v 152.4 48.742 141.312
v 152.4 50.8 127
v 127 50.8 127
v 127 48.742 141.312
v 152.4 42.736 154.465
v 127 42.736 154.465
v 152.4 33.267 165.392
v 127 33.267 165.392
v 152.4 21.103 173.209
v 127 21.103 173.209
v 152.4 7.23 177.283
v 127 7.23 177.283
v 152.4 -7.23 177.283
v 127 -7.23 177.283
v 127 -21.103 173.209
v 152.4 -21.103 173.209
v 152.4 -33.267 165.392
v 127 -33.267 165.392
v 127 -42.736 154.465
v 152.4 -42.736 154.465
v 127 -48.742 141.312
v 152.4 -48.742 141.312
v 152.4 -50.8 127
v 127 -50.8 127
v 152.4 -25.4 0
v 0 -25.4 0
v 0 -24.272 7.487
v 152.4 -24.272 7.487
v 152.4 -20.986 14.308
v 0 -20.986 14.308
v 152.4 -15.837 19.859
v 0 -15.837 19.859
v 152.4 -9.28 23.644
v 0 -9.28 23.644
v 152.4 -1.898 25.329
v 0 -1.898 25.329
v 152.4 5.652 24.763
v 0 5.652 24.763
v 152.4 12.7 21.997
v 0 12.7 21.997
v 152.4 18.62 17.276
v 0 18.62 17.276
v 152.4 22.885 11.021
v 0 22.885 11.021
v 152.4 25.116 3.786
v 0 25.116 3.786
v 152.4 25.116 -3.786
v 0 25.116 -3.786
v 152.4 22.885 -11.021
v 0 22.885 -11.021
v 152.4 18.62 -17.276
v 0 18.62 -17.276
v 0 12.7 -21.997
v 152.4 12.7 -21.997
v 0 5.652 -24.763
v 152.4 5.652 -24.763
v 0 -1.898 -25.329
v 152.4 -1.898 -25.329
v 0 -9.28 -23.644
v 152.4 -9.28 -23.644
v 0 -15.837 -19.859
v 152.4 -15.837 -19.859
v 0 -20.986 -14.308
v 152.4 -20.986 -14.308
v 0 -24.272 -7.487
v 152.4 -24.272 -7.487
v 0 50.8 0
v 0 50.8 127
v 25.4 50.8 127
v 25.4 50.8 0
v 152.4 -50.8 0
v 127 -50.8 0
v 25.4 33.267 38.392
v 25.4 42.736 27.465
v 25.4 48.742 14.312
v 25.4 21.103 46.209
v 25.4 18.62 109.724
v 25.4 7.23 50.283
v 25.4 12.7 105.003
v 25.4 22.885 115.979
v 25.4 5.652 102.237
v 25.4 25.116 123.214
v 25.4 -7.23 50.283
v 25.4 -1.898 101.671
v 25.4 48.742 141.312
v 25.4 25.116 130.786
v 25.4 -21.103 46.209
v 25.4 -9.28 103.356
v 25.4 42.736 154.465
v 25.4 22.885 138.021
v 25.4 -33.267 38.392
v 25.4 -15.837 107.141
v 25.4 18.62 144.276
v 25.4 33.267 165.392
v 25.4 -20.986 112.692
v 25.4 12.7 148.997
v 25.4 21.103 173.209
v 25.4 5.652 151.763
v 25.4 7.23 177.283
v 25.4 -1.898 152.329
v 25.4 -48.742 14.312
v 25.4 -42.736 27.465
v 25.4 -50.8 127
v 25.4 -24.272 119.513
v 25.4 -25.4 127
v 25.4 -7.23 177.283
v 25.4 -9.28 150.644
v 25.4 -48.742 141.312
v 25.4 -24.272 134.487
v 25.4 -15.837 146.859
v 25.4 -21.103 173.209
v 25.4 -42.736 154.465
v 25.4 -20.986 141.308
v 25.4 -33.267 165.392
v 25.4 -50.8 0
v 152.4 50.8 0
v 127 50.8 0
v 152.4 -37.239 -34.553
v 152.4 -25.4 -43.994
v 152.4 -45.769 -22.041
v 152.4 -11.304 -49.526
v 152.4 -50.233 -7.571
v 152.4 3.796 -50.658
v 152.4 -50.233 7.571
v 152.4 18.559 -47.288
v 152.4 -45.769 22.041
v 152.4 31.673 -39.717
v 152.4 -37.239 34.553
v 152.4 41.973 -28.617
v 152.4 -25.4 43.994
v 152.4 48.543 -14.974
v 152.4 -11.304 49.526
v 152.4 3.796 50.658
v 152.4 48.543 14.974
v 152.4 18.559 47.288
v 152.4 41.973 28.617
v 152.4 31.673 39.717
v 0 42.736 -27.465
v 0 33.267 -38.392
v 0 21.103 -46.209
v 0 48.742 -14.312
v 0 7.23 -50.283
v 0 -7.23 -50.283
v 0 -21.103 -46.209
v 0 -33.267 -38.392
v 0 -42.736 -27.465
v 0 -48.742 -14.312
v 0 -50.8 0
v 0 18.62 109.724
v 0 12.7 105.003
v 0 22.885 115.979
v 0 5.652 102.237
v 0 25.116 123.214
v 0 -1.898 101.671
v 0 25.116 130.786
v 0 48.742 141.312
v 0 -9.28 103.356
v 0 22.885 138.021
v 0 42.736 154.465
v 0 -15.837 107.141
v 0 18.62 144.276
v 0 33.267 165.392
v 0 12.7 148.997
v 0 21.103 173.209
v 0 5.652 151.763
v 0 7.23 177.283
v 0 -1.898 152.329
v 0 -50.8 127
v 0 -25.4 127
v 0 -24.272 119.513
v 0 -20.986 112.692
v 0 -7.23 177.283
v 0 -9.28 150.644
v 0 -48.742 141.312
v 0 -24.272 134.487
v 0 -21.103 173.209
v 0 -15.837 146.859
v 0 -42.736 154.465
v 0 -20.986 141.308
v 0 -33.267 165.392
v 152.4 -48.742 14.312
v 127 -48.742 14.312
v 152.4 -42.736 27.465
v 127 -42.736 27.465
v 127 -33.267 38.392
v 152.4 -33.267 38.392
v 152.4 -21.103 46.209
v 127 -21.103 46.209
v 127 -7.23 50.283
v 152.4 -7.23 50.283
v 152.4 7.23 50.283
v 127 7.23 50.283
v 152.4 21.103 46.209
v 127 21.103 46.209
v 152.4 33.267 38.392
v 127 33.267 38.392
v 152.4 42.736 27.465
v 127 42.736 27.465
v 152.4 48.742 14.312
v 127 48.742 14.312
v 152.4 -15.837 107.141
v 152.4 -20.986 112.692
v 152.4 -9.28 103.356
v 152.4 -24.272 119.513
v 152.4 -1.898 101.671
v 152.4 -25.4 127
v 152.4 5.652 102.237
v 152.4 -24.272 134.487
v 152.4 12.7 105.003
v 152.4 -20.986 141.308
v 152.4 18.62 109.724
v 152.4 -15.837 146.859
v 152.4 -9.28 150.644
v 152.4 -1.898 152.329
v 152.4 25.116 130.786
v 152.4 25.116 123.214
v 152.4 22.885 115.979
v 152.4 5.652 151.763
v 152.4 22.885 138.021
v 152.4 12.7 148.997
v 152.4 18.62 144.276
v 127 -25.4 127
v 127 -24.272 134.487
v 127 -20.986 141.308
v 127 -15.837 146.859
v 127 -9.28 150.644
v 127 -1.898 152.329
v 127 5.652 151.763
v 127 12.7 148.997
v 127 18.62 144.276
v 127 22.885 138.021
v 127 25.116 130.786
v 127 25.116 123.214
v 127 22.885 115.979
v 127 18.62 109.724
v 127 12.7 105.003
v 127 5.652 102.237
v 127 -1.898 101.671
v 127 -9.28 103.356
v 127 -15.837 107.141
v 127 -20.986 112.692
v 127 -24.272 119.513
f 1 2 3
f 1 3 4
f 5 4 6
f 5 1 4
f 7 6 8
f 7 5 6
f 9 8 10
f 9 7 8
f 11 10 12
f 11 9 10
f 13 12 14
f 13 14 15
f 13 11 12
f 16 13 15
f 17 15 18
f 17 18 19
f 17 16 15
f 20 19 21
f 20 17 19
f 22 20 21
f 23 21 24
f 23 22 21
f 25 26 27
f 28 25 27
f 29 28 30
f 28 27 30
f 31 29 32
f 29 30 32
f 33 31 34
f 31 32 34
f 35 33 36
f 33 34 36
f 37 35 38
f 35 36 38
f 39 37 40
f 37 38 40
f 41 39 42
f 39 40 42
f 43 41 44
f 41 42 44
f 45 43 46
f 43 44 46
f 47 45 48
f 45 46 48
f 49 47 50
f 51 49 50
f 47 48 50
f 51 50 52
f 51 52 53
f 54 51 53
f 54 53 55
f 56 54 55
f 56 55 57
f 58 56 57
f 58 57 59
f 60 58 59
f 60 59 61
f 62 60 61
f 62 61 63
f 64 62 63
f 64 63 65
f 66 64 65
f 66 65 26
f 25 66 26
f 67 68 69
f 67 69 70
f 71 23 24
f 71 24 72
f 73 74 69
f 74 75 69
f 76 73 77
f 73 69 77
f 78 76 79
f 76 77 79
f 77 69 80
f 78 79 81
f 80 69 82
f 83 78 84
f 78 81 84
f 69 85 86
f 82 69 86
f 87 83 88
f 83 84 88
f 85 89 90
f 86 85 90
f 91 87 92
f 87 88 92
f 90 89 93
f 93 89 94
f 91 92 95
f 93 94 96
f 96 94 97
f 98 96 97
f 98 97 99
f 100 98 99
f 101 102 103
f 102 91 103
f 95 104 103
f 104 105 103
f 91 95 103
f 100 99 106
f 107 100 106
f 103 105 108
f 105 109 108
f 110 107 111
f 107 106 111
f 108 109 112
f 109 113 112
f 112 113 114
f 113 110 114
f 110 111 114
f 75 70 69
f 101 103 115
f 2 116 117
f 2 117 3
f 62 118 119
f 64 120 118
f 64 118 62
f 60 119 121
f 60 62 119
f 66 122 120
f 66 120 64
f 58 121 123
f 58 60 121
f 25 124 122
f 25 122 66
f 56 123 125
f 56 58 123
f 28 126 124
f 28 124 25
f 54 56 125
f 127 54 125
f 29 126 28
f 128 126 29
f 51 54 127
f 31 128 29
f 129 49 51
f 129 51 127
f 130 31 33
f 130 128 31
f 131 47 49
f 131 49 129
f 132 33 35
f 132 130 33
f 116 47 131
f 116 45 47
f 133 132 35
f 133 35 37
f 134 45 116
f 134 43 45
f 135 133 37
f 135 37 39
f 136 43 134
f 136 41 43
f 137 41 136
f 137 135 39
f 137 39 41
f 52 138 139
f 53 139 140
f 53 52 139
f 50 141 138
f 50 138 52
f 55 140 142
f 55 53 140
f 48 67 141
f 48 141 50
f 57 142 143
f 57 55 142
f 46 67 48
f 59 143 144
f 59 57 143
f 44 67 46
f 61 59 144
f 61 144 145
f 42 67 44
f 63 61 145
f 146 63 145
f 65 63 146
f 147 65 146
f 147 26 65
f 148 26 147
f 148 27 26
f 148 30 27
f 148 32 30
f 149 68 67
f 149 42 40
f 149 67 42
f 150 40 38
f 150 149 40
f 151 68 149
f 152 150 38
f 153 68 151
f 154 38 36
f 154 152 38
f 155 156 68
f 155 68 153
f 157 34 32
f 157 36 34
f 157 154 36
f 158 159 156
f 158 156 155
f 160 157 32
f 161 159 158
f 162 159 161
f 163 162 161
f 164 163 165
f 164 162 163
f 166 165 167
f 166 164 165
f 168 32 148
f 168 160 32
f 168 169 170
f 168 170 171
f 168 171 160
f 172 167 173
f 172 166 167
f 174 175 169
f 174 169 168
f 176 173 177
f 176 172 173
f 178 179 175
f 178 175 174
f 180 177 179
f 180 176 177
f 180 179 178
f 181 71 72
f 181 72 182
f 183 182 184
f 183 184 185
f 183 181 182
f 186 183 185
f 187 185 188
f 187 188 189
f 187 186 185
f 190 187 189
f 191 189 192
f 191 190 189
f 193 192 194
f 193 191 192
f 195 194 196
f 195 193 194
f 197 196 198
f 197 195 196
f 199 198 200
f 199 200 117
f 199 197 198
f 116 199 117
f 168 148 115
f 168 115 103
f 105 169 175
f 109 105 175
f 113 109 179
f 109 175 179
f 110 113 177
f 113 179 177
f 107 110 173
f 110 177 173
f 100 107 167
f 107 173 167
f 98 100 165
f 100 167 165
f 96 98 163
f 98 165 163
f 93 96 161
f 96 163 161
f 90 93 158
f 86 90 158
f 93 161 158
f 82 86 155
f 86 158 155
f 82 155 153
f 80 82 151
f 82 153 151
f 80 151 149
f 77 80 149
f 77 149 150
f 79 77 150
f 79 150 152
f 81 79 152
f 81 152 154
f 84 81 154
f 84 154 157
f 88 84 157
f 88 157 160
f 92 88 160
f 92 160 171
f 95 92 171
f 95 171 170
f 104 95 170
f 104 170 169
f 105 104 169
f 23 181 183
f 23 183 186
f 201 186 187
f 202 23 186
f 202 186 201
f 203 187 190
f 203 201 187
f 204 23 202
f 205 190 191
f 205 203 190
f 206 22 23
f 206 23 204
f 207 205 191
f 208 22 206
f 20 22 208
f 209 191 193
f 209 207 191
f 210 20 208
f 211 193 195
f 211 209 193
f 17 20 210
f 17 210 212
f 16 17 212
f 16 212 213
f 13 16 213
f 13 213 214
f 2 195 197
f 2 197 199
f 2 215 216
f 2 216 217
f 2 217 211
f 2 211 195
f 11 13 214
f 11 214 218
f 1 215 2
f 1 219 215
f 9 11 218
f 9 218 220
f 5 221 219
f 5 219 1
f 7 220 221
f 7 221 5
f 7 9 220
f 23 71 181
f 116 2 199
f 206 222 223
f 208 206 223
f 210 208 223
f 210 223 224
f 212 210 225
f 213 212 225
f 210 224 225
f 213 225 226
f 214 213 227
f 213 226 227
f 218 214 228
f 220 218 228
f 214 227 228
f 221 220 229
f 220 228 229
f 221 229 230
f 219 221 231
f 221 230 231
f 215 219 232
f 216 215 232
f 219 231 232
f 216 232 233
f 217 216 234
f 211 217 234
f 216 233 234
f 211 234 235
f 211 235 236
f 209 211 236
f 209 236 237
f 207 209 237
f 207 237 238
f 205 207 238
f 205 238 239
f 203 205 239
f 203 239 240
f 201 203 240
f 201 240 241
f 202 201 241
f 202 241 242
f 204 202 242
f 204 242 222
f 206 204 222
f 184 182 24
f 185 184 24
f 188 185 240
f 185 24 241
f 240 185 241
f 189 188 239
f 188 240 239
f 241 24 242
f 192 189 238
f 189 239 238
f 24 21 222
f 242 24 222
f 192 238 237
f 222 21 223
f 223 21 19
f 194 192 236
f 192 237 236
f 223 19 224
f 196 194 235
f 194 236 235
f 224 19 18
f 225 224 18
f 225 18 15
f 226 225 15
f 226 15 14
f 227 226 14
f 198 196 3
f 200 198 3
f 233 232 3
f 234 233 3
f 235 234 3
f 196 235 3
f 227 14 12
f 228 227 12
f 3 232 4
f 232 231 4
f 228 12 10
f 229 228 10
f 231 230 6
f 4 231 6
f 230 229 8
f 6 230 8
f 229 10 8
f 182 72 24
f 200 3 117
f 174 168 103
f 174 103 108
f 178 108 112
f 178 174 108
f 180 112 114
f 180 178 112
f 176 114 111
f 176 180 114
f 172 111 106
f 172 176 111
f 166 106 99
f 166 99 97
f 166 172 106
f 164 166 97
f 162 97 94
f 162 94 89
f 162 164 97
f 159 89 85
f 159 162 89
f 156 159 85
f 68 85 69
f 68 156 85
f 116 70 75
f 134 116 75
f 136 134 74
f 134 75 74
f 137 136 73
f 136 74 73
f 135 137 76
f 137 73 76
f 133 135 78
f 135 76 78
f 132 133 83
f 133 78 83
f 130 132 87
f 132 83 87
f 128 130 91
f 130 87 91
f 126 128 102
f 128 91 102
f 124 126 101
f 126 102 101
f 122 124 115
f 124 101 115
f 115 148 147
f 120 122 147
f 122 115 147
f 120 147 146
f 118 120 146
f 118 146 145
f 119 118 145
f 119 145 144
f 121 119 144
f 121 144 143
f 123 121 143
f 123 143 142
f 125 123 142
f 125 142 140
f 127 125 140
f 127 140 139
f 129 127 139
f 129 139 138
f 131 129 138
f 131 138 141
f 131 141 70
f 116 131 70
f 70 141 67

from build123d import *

# Parameters (mm, degrees)
F0_R     = 50.8
F1_DEPTH = 152.4
F3_DEPTH = 25.4
F5_DEPTH = 25.4
F6_R     = 25.4
F7_DEPTH = 152.401
F8_R     = 25.4
F9_DEPTH = 152.401


with BuildPart() as f1:
    # F0 (on Right) → F1 (new body)
    with BuildSketch(Plane.YZ):
        Circle(F0_R)
    extrude(amount=F1_DEPTH)

    # F4 (on face) → F5 (join)
    with BuildSketch(Plane(origin=(0, 0, 0), x_dir=(0, -1, 0), z_dir=(-1, 0, 0))):
        with BuildLine():
            Line((-50.8, 127), (-50.8, 0))
            Line((-50.8, 0), (50.8, 0))
            Line((50.8, 0), (50.8, 127))
            ThreePointArc((50.8, 127), (0, 177.8), (-50.8, 127))
        make_face()
    extrude(amount=-F5_DEPTH)


with BuildPart() as f3:
    # F2 (on face) → F3 (new body)
    with BuildSketch(Plane.YZ.offset(152.4)):
        with BuildLine():
            Line((-50.8, 127), (-50.8, 0))
            ThreePointArc((-50.8, 0), (0, 50.8), (50.8, 0))
            Line((50.8, 0), (50.8, 127))
            ThreePointArc((50.8, 127), (0, 177.8), (-50.8, 127))
        make_face()
    extrude(amount=-F3_DEPTH)


with BuildPart() as f7_tool:
    # F6 (on face) → F7 (new body, through all)
    with BuildSketch(Plane(origin=(0, 0, 0), x_dir=(0, -1, 0), z_dir=(-1, 0, 0))):
        with Locations((0, 127)):
            Circle(F6_R)
        Circle(F6_R)
    extrude(amount=-F7_DEPTH)


with BuildPart() as f1_1:
    add(f1.part)

    # F7: cut by f7_tool
    add(f7_tool.part, mode=Mode.SUBTRACT)

    # F8 (on face) → F9 (cut, through all)
    with BuildSketch(Plane.YZ.offset(152.4)):
        with Locations((0, 127)):
            Circle(F8_R)
    extrude(amount=-F9_DEPTH, mode=Mode.SUBTRACT)


with BuildPart() as f3_1:
    add(f3.part)

    # F7: cut by f7_tool
    add(f7_tool.part, mode=Mode.SUBTRACT)


solid = Compound([f1_1.part, f3_1.part])
